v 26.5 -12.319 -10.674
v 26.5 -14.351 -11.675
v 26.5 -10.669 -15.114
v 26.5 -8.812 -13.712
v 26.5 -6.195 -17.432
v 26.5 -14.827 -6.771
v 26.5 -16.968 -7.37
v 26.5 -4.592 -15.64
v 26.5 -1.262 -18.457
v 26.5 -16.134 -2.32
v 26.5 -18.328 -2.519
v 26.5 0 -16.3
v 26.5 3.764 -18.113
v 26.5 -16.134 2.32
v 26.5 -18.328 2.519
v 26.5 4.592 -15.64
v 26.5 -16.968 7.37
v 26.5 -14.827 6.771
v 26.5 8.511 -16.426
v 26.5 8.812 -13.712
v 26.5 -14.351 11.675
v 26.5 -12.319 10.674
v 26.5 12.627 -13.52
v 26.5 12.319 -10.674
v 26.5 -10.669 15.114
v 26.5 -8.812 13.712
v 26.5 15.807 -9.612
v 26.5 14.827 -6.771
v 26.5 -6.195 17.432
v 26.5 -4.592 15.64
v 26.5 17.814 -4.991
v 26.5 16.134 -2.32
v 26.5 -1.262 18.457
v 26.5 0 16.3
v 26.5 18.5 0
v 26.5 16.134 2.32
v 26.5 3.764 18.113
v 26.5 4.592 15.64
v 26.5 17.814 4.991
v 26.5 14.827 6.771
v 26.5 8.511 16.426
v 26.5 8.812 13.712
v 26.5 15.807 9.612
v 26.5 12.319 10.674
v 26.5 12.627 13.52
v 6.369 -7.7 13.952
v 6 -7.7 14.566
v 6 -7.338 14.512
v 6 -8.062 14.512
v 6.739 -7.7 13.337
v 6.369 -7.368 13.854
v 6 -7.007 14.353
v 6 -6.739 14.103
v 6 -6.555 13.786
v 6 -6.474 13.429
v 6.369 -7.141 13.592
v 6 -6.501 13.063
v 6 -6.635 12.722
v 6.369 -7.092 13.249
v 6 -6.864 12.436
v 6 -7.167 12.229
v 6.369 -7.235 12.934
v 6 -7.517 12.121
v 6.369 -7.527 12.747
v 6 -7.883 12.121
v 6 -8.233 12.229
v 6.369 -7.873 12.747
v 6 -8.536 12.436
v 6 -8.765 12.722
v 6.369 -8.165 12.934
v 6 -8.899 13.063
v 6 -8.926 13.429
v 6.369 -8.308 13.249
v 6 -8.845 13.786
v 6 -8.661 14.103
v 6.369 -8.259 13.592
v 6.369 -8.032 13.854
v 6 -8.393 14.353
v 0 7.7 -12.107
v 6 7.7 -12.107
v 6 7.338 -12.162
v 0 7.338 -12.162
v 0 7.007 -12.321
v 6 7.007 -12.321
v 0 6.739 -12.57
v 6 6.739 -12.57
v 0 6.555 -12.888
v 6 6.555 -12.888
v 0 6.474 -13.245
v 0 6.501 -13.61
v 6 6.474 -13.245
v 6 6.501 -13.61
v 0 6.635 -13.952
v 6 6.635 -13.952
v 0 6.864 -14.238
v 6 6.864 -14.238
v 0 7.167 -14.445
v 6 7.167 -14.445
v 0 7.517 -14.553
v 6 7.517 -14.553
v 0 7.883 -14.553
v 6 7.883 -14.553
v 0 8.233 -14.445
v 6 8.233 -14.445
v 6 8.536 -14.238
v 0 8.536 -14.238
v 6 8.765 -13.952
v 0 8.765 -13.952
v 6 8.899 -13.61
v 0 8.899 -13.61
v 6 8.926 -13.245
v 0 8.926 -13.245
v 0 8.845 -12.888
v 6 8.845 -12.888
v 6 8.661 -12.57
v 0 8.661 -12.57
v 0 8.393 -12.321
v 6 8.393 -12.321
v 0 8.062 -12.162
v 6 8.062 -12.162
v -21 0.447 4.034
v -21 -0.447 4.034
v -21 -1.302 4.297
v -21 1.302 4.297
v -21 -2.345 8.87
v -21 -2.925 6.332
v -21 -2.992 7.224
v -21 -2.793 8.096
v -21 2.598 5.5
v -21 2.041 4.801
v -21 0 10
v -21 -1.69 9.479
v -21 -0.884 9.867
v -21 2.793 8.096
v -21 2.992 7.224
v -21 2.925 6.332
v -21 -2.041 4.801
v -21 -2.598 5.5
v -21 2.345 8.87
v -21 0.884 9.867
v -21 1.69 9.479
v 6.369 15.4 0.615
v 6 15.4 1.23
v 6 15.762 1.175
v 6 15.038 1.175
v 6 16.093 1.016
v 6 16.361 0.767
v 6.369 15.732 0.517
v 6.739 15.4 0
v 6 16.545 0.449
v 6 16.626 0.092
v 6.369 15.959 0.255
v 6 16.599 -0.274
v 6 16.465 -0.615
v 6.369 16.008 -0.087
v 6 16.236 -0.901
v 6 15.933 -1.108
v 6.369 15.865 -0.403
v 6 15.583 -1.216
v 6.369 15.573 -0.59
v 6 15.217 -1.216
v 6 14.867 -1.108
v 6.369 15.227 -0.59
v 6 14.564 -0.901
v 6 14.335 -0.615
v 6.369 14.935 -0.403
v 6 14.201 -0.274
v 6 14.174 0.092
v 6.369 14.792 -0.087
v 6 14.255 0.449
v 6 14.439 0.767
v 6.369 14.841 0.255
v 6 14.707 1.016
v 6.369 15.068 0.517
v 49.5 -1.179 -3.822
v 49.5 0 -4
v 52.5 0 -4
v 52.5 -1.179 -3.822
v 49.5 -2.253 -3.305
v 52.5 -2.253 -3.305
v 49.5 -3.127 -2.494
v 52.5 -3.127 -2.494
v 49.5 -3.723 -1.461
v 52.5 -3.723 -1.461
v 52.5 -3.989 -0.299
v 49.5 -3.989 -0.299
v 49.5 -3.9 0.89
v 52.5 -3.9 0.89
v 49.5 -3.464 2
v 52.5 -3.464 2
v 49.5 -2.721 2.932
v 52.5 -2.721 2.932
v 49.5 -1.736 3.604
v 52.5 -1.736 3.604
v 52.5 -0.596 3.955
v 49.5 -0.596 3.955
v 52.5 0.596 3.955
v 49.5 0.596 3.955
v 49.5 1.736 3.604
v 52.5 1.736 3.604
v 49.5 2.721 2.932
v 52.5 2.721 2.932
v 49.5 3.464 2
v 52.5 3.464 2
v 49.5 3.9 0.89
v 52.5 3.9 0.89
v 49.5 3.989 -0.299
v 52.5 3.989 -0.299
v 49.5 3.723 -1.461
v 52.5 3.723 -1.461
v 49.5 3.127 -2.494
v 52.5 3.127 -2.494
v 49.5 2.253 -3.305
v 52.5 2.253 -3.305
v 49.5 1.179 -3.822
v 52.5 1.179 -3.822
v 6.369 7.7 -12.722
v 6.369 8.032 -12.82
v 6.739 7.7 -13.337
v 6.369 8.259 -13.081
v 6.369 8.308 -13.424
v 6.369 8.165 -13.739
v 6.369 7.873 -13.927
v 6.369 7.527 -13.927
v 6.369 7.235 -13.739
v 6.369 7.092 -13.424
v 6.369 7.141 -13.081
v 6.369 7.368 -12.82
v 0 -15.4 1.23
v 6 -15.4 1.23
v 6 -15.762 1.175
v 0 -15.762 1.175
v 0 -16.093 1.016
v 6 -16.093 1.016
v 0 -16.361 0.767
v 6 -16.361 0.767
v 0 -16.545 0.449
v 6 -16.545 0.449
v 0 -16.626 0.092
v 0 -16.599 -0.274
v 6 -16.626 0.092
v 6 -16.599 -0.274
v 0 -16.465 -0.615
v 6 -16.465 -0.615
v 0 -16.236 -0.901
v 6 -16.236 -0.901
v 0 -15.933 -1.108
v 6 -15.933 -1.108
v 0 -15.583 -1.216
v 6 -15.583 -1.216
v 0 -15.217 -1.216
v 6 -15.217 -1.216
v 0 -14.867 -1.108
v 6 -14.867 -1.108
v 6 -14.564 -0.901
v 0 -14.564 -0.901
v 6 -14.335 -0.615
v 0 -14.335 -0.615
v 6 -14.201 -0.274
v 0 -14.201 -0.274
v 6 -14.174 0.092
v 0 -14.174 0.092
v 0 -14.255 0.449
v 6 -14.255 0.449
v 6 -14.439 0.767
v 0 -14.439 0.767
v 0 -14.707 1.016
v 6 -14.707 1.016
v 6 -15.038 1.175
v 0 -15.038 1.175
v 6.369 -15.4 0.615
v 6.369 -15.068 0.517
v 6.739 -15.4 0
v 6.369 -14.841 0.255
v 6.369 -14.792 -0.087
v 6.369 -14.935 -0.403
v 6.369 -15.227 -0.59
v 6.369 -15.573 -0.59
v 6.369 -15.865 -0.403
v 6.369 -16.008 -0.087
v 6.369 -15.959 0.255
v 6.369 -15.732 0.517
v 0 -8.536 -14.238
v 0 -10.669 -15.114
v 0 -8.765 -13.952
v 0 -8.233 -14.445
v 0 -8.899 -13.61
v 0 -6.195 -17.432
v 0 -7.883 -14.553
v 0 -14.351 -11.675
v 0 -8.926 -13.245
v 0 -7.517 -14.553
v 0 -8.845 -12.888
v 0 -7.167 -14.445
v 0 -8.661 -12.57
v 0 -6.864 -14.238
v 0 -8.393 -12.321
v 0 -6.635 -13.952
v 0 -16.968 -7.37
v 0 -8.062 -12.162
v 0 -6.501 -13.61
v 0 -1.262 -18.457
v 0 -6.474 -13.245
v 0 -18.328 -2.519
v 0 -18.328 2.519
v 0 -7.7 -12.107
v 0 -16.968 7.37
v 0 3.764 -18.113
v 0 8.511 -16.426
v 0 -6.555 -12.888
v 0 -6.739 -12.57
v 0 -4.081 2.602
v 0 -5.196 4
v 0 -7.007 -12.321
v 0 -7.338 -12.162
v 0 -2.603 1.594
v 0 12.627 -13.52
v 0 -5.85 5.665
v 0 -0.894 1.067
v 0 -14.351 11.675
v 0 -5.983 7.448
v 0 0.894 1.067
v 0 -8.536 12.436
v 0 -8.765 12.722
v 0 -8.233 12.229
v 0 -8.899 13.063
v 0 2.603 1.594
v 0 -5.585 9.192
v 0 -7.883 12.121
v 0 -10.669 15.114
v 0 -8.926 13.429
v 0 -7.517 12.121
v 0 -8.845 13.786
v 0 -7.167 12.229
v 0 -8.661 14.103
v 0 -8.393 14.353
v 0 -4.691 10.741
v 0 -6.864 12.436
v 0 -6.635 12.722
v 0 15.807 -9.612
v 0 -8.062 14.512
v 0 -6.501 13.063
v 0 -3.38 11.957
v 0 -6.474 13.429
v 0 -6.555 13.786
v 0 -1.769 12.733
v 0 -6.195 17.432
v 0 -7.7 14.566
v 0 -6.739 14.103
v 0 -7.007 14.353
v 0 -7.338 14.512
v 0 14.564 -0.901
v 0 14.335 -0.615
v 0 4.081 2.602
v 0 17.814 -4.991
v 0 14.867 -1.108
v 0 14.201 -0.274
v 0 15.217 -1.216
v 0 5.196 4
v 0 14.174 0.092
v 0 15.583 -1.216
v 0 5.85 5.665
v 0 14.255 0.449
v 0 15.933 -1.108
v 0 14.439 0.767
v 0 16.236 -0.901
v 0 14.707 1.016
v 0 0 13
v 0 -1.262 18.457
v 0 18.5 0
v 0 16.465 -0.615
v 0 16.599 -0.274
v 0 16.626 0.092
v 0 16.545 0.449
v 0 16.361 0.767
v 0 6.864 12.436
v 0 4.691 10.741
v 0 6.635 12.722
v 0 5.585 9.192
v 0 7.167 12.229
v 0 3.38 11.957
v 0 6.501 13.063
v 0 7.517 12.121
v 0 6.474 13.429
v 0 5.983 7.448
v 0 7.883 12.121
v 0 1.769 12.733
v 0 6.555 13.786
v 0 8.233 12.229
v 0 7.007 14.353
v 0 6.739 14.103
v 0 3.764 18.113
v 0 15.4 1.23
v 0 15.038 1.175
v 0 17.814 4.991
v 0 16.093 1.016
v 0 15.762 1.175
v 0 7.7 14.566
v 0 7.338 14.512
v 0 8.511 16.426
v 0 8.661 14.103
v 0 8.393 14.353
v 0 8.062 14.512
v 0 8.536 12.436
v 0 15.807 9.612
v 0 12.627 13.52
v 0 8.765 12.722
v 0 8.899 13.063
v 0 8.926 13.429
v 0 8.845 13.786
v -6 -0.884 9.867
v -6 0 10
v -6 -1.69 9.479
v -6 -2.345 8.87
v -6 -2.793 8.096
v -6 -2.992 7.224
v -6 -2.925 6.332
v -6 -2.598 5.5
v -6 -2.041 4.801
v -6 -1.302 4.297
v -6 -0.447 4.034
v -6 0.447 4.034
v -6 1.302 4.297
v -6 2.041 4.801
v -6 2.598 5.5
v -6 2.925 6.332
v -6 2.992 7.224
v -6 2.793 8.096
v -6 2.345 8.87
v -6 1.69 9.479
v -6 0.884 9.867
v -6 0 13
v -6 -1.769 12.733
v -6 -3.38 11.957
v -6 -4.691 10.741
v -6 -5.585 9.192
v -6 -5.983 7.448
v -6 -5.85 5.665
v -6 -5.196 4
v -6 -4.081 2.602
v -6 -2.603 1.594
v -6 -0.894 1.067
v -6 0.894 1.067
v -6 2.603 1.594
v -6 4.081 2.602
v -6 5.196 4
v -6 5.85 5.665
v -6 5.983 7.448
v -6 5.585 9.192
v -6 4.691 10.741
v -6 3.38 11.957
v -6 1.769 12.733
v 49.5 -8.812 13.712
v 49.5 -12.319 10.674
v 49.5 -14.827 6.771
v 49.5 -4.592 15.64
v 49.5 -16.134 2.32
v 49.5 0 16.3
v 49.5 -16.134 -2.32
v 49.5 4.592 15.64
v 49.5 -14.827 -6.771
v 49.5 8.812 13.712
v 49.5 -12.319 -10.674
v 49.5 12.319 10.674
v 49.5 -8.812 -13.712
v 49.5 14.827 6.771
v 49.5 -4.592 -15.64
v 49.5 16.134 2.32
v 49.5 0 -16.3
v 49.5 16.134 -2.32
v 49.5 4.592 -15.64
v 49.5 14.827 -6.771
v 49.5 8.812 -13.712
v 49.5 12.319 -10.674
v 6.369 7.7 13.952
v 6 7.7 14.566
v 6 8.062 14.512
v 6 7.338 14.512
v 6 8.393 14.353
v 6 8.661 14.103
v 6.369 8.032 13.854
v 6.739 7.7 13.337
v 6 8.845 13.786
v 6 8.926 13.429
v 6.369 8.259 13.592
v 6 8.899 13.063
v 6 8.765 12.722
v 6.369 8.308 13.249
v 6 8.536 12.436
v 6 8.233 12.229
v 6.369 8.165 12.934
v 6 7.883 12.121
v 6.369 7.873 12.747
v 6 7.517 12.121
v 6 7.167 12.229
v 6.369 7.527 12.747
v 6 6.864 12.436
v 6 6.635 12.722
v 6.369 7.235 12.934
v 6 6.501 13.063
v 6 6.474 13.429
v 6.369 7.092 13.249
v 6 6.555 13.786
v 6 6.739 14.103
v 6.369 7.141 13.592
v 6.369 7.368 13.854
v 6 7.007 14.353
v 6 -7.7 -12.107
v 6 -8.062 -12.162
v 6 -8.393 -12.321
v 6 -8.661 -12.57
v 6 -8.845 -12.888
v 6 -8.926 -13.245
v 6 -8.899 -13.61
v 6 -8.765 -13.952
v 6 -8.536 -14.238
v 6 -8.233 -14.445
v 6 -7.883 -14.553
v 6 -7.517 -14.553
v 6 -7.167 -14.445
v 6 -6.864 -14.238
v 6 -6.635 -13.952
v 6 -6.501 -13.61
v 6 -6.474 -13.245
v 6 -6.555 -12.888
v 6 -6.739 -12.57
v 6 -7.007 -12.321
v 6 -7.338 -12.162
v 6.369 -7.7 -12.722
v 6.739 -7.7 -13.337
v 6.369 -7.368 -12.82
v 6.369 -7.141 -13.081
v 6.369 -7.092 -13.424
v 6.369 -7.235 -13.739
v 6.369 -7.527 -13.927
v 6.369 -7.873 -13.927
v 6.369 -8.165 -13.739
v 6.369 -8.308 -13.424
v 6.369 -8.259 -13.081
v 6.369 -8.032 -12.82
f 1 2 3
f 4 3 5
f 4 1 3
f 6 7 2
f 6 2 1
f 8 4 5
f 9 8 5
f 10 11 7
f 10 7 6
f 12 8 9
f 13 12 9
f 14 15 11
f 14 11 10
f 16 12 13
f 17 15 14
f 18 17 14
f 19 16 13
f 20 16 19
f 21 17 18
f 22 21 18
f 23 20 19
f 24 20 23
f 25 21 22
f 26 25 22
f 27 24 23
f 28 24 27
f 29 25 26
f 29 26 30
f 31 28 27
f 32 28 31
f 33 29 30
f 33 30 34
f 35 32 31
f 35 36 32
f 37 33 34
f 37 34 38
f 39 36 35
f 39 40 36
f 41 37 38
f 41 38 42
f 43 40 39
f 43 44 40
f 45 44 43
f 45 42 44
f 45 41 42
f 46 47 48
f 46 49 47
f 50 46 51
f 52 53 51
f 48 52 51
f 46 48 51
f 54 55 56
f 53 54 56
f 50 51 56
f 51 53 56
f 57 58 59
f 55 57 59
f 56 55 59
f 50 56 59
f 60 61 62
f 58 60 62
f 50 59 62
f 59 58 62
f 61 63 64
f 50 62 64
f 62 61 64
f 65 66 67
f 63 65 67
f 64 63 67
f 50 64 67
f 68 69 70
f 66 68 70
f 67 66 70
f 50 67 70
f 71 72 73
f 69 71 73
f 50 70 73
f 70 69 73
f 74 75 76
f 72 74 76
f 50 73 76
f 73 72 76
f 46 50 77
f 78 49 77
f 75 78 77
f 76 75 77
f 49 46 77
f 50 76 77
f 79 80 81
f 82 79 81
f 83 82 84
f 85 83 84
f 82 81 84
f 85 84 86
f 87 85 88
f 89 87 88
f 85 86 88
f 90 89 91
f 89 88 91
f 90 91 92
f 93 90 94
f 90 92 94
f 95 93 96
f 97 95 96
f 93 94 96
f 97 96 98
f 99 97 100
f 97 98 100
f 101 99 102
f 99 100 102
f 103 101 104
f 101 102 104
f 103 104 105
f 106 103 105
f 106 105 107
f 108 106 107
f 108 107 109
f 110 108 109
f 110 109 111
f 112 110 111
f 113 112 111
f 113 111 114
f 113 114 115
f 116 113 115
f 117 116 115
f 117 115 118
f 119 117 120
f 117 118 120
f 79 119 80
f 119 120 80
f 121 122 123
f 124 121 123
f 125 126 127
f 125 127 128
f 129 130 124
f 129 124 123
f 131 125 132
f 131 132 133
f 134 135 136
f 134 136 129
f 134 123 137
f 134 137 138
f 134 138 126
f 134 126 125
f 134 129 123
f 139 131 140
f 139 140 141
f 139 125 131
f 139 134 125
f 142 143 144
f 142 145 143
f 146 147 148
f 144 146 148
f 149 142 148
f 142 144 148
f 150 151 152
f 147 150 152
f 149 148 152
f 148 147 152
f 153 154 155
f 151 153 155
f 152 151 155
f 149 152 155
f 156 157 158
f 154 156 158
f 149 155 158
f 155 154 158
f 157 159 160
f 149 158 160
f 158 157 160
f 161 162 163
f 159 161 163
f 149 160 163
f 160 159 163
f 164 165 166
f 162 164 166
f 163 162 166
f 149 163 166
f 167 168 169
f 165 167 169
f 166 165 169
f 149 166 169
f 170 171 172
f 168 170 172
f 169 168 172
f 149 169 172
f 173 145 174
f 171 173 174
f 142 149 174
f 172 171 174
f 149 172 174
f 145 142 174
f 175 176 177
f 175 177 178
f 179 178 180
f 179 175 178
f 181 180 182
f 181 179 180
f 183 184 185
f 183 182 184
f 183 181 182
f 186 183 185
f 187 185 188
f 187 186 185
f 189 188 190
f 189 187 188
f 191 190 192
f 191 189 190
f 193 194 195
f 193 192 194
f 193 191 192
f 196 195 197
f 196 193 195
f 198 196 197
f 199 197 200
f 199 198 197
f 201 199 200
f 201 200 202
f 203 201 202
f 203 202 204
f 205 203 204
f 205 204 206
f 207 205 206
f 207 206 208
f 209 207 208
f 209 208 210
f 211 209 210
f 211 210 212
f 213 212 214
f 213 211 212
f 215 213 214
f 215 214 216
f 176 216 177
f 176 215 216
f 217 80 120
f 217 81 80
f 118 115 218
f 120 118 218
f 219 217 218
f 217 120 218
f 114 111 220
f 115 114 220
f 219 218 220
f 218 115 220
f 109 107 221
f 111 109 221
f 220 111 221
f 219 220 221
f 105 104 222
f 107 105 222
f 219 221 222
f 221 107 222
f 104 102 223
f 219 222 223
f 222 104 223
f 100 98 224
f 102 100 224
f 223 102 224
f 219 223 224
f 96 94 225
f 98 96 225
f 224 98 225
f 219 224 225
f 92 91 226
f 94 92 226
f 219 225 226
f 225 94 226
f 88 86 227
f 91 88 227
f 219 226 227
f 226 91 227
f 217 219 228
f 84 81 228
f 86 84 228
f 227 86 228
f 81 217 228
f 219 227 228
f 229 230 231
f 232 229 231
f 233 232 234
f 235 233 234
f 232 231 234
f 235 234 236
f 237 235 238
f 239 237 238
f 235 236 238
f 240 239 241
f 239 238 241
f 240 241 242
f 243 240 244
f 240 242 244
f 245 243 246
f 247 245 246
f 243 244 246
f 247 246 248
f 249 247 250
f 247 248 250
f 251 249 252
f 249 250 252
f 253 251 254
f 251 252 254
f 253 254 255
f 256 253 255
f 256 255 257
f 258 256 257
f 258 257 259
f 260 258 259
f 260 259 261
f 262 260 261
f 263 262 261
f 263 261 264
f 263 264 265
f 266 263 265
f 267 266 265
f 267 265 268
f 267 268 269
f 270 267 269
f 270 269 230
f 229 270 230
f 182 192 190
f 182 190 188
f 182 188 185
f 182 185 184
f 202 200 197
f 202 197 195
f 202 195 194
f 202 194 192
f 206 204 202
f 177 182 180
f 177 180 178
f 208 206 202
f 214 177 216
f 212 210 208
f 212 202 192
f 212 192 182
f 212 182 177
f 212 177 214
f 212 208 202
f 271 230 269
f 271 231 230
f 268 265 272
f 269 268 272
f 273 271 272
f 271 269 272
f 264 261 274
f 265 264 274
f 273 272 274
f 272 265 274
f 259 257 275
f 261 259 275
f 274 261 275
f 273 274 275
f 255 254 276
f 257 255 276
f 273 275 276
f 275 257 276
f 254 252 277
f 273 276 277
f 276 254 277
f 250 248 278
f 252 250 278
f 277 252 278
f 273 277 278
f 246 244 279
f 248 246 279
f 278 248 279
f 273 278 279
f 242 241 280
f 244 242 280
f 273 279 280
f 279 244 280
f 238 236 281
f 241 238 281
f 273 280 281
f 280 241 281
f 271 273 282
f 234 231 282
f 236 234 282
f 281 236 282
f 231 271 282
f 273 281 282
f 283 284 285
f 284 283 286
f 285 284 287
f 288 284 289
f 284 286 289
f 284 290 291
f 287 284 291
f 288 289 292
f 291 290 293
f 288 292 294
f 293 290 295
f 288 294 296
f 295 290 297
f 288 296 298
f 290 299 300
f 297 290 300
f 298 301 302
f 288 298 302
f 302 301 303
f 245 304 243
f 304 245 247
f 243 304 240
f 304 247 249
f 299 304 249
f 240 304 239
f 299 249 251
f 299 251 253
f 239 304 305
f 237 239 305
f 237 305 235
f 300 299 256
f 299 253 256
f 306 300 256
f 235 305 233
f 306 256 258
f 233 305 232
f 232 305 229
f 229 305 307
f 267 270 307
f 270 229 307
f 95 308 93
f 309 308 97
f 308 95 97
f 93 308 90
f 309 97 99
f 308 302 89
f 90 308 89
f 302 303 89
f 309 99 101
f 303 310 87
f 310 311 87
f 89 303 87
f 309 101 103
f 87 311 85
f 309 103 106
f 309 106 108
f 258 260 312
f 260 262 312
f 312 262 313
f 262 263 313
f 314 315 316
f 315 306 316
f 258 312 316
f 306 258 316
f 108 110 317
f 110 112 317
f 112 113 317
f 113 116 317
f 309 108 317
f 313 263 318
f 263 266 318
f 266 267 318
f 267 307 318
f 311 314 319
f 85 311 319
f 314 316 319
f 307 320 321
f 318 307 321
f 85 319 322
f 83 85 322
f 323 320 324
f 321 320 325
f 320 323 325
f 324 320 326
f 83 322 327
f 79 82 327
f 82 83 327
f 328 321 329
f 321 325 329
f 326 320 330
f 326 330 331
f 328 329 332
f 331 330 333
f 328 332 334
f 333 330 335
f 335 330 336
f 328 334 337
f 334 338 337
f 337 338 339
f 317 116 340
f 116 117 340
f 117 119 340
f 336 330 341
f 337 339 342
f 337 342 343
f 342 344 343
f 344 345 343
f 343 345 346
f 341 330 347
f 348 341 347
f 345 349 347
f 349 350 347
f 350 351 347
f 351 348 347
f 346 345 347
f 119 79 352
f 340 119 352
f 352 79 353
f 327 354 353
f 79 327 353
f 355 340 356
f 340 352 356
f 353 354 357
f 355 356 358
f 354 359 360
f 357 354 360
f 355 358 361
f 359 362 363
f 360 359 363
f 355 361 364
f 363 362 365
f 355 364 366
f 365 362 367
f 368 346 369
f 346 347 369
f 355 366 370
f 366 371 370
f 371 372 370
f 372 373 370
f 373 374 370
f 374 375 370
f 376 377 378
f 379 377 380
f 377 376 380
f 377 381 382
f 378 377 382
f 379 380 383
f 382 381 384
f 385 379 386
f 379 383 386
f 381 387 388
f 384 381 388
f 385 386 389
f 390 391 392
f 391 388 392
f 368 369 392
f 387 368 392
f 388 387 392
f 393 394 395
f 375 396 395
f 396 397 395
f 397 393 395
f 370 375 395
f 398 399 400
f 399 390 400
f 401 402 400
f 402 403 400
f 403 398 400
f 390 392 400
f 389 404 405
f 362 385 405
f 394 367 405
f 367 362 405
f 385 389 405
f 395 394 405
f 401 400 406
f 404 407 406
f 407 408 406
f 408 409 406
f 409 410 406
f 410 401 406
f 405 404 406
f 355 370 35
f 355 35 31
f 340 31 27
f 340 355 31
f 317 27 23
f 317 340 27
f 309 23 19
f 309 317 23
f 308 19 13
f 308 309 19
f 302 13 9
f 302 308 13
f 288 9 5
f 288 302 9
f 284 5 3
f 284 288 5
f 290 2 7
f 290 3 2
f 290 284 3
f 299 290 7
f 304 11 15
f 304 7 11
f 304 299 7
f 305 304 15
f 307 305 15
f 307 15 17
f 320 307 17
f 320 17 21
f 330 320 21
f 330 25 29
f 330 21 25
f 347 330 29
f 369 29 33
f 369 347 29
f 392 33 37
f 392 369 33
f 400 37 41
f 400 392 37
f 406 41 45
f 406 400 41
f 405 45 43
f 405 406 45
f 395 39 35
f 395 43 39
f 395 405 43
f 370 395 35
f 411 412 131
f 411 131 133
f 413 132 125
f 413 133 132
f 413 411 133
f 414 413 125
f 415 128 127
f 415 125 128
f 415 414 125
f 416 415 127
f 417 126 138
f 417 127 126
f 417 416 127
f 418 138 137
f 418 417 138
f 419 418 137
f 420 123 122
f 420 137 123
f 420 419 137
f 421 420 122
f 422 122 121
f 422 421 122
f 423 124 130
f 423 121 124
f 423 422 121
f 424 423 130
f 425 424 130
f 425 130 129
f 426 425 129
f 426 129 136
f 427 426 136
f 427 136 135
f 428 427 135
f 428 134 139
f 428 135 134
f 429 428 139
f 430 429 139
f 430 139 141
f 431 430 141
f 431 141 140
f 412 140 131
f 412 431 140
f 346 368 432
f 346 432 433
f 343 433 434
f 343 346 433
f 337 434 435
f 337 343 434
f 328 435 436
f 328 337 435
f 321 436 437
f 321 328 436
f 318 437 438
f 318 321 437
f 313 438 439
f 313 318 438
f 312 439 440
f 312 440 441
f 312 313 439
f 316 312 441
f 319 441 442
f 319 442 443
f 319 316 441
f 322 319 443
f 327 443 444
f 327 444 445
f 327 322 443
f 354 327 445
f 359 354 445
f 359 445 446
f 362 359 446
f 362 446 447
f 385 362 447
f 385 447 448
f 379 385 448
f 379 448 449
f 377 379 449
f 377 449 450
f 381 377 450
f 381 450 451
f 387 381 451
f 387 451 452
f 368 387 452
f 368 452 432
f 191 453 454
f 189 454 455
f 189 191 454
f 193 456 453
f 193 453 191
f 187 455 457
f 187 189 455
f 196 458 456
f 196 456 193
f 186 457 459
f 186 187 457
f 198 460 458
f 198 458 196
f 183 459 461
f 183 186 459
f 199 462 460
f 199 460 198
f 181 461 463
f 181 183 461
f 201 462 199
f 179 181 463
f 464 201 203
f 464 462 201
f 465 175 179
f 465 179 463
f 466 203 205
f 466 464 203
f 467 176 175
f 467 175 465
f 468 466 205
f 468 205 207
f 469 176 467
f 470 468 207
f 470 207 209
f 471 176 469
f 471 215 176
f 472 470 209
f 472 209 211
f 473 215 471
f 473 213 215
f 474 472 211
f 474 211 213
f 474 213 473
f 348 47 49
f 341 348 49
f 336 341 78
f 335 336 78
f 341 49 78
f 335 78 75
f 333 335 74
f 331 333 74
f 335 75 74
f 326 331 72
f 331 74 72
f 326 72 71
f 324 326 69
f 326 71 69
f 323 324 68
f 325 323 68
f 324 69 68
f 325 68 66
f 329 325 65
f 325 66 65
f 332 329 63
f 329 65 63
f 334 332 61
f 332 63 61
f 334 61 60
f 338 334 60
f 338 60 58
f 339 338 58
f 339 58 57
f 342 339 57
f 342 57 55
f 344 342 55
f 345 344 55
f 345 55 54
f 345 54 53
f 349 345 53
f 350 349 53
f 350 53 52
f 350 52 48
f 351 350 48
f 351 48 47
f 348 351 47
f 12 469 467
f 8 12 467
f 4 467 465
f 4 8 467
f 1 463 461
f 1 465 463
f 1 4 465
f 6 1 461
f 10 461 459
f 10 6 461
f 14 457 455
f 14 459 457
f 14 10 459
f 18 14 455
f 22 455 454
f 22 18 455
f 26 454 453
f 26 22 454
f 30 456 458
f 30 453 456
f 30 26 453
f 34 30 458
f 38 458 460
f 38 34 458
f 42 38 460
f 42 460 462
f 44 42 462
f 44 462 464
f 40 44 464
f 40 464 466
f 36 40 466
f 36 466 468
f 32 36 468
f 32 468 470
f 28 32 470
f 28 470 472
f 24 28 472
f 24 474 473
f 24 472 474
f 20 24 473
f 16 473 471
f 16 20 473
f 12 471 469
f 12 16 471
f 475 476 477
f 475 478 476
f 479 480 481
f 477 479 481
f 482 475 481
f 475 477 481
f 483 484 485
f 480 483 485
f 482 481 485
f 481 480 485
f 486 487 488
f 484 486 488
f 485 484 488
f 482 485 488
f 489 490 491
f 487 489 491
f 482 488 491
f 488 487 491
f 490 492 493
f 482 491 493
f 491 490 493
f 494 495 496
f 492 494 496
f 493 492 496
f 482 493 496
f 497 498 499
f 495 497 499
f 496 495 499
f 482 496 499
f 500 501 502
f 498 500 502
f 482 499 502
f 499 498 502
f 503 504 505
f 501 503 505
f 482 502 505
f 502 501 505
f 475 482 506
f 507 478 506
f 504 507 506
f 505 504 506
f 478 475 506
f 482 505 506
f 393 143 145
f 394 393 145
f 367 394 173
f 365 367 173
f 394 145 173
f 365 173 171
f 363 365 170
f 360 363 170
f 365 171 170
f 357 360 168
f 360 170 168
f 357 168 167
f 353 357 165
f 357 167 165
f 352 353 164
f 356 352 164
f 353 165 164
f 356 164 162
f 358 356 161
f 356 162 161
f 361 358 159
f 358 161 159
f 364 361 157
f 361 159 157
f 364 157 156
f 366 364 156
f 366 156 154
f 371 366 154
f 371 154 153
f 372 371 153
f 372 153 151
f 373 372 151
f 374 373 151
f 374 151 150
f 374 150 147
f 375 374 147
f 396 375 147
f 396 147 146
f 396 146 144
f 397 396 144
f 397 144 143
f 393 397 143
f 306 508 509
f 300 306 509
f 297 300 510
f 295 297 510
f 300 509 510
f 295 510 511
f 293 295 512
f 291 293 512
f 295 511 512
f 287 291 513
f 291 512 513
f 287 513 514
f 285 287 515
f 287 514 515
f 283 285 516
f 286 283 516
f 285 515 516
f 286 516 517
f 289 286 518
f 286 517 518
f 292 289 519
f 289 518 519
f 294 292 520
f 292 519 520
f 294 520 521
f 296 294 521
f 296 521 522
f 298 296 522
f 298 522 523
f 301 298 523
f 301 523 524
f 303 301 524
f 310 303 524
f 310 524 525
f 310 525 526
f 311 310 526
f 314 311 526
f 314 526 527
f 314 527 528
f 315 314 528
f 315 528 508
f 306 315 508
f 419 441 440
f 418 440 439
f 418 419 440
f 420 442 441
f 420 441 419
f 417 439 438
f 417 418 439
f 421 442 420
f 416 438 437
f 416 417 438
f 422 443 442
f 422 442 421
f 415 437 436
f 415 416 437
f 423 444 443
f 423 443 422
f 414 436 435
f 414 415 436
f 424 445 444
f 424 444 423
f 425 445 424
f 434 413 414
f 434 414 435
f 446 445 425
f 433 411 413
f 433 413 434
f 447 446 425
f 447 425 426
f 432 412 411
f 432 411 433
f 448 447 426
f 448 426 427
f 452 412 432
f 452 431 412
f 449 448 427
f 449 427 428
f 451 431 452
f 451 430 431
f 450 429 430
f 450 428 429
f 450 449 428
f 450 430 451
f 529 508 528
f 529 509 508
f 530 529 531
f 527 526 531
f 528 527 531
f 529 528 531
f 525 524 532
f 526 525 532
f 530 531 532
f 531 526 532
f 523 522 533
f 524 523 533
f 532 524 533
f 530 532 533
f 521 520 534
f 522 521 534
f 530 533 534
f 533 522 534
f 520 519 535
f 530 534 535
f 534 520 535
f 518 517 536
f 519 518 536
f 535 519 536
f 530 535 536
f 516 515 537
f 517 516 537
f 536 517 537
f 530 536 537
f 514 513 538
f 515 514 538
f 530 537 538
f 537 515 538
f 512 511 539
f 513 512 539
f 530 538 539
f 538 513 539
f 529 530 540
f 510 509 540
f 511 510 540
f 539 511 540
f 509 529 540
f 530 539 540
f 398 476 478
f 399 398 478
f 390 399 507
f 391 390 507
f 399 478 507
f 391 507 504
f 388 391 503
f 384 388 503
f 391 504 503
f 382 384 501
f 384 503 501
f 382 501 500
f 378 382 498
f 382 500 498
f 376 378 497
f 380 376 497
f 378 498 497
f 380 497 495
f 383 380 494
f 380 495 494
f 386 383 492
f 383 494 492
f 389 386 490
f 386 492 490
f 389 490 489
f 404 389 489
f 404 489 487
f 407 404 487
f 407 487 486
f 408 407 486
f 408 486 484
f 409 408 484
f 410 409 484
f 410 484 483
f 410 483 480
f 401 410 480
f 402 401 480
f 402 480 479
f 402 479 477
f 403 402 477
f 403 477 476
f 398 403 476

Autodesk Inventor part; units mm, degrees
ref_plane "YZ Plane" through (0, 0, 0) normal (1, 0, 0) x (0, 1, 0)
ref_plane "XZ Plane" through (0, 0, 0) normal (0, 1, 0) x (-1, 0, 0)
ref_plane "XY Plane" through (0, 0, 0) normal (0, 0, 1) x (1, 0, 0)
sketch "Skizze1" plane through (0, 0, 0) normal (1, 0, 0) x (0, 1, 0)
  circle A0 centre (0, 0) radius 18.5
  dimension "d0" = 37
extrude "Extrusion1" add sketch "Skizze1" along normal blind 26.5
sketch "Skizze2" plane through (26.5, 0, 0) normal (1, 0, 0) x (0, 0, -1)
  circle A0 centre (0, 0) radius 16.3
  dimension "d3" = 32.6
extrude "Extrusion2" add sketch "Skizze2" along normal blind 23
sketch "Skizze3" plane through (49.5, 0, 0) normal (1, 0, 0) x (0, 0, -1)
  circle A0 centre (0, 0) radius 4
  dimension "d6" = 8
extrude "Extrusion3" add sketch "Skizze3" along normal blind 3
sketch "Skizze4" plane through (0, 0, 0) normal (-1, 0, 0) x (0, 0, 1)
  line L0 (-25.9, 0) -> (25.9, 0) projected
  line L1 (0, 25.9) -> (0, -25.9) projected
  circle A0 centre (7, 0) radius 6
  point P0 (0, 0)
  dimension "d9" = 12
  dimension "d10" = 7
extrude "Extrusion4" add sketch "Skizze4" along normal blind 6
sketch "Skizze5" plane through (-6, 0, 7) normal (-1, 0, 0) x (0, 0, 1)
  circle A0 centre (0, 0) radius 6 projected
  circle A1 centre (0, 0) radius 3
  point P0 (-7, 0)
  dimension "d13" = 6
extrude "Extrusion5" add sketch "Skizze5" along normal blind 15 contours A1
sketch "Skizze6" plane through (0, 0, 0) normal (-1, 0, 0) x (0, 0, 1)
  line L0 (-25.9, 0) -> (25.9, 0) projected
  line L1 (0, 25.9) -> (0, -25.9) projected
  circle A0 centre (0, 0) radius 15.4 construction
  point P0 (0, 15.4)
  point P1 (-13.3368, 7.7)
  point P2 (-13.3368, -7.7)
  point P3 (0, -15.4)
  point P4 (13.3368, -7.7)
  point P5 (13.3368, 7.7)
  dimension "d16" = 30.8
  dimension "d19" = 360
hole "Bohrung1" at (0, 15.4, 0) at (0, 7.7, -13.3368) at (0, -7.7, -13.3368) at (0, -15.4, 0) at (0, -7.7, 13.3368) at (0, 7.7, 13.3368) direction (1, 0, 0) diameter 2.459 depth 6 tip angle 118 thread size "M3x0.5" class "6H" standard "ISO Metric profile"
properties part number "V-TEC 12V Mini 37D DC"
